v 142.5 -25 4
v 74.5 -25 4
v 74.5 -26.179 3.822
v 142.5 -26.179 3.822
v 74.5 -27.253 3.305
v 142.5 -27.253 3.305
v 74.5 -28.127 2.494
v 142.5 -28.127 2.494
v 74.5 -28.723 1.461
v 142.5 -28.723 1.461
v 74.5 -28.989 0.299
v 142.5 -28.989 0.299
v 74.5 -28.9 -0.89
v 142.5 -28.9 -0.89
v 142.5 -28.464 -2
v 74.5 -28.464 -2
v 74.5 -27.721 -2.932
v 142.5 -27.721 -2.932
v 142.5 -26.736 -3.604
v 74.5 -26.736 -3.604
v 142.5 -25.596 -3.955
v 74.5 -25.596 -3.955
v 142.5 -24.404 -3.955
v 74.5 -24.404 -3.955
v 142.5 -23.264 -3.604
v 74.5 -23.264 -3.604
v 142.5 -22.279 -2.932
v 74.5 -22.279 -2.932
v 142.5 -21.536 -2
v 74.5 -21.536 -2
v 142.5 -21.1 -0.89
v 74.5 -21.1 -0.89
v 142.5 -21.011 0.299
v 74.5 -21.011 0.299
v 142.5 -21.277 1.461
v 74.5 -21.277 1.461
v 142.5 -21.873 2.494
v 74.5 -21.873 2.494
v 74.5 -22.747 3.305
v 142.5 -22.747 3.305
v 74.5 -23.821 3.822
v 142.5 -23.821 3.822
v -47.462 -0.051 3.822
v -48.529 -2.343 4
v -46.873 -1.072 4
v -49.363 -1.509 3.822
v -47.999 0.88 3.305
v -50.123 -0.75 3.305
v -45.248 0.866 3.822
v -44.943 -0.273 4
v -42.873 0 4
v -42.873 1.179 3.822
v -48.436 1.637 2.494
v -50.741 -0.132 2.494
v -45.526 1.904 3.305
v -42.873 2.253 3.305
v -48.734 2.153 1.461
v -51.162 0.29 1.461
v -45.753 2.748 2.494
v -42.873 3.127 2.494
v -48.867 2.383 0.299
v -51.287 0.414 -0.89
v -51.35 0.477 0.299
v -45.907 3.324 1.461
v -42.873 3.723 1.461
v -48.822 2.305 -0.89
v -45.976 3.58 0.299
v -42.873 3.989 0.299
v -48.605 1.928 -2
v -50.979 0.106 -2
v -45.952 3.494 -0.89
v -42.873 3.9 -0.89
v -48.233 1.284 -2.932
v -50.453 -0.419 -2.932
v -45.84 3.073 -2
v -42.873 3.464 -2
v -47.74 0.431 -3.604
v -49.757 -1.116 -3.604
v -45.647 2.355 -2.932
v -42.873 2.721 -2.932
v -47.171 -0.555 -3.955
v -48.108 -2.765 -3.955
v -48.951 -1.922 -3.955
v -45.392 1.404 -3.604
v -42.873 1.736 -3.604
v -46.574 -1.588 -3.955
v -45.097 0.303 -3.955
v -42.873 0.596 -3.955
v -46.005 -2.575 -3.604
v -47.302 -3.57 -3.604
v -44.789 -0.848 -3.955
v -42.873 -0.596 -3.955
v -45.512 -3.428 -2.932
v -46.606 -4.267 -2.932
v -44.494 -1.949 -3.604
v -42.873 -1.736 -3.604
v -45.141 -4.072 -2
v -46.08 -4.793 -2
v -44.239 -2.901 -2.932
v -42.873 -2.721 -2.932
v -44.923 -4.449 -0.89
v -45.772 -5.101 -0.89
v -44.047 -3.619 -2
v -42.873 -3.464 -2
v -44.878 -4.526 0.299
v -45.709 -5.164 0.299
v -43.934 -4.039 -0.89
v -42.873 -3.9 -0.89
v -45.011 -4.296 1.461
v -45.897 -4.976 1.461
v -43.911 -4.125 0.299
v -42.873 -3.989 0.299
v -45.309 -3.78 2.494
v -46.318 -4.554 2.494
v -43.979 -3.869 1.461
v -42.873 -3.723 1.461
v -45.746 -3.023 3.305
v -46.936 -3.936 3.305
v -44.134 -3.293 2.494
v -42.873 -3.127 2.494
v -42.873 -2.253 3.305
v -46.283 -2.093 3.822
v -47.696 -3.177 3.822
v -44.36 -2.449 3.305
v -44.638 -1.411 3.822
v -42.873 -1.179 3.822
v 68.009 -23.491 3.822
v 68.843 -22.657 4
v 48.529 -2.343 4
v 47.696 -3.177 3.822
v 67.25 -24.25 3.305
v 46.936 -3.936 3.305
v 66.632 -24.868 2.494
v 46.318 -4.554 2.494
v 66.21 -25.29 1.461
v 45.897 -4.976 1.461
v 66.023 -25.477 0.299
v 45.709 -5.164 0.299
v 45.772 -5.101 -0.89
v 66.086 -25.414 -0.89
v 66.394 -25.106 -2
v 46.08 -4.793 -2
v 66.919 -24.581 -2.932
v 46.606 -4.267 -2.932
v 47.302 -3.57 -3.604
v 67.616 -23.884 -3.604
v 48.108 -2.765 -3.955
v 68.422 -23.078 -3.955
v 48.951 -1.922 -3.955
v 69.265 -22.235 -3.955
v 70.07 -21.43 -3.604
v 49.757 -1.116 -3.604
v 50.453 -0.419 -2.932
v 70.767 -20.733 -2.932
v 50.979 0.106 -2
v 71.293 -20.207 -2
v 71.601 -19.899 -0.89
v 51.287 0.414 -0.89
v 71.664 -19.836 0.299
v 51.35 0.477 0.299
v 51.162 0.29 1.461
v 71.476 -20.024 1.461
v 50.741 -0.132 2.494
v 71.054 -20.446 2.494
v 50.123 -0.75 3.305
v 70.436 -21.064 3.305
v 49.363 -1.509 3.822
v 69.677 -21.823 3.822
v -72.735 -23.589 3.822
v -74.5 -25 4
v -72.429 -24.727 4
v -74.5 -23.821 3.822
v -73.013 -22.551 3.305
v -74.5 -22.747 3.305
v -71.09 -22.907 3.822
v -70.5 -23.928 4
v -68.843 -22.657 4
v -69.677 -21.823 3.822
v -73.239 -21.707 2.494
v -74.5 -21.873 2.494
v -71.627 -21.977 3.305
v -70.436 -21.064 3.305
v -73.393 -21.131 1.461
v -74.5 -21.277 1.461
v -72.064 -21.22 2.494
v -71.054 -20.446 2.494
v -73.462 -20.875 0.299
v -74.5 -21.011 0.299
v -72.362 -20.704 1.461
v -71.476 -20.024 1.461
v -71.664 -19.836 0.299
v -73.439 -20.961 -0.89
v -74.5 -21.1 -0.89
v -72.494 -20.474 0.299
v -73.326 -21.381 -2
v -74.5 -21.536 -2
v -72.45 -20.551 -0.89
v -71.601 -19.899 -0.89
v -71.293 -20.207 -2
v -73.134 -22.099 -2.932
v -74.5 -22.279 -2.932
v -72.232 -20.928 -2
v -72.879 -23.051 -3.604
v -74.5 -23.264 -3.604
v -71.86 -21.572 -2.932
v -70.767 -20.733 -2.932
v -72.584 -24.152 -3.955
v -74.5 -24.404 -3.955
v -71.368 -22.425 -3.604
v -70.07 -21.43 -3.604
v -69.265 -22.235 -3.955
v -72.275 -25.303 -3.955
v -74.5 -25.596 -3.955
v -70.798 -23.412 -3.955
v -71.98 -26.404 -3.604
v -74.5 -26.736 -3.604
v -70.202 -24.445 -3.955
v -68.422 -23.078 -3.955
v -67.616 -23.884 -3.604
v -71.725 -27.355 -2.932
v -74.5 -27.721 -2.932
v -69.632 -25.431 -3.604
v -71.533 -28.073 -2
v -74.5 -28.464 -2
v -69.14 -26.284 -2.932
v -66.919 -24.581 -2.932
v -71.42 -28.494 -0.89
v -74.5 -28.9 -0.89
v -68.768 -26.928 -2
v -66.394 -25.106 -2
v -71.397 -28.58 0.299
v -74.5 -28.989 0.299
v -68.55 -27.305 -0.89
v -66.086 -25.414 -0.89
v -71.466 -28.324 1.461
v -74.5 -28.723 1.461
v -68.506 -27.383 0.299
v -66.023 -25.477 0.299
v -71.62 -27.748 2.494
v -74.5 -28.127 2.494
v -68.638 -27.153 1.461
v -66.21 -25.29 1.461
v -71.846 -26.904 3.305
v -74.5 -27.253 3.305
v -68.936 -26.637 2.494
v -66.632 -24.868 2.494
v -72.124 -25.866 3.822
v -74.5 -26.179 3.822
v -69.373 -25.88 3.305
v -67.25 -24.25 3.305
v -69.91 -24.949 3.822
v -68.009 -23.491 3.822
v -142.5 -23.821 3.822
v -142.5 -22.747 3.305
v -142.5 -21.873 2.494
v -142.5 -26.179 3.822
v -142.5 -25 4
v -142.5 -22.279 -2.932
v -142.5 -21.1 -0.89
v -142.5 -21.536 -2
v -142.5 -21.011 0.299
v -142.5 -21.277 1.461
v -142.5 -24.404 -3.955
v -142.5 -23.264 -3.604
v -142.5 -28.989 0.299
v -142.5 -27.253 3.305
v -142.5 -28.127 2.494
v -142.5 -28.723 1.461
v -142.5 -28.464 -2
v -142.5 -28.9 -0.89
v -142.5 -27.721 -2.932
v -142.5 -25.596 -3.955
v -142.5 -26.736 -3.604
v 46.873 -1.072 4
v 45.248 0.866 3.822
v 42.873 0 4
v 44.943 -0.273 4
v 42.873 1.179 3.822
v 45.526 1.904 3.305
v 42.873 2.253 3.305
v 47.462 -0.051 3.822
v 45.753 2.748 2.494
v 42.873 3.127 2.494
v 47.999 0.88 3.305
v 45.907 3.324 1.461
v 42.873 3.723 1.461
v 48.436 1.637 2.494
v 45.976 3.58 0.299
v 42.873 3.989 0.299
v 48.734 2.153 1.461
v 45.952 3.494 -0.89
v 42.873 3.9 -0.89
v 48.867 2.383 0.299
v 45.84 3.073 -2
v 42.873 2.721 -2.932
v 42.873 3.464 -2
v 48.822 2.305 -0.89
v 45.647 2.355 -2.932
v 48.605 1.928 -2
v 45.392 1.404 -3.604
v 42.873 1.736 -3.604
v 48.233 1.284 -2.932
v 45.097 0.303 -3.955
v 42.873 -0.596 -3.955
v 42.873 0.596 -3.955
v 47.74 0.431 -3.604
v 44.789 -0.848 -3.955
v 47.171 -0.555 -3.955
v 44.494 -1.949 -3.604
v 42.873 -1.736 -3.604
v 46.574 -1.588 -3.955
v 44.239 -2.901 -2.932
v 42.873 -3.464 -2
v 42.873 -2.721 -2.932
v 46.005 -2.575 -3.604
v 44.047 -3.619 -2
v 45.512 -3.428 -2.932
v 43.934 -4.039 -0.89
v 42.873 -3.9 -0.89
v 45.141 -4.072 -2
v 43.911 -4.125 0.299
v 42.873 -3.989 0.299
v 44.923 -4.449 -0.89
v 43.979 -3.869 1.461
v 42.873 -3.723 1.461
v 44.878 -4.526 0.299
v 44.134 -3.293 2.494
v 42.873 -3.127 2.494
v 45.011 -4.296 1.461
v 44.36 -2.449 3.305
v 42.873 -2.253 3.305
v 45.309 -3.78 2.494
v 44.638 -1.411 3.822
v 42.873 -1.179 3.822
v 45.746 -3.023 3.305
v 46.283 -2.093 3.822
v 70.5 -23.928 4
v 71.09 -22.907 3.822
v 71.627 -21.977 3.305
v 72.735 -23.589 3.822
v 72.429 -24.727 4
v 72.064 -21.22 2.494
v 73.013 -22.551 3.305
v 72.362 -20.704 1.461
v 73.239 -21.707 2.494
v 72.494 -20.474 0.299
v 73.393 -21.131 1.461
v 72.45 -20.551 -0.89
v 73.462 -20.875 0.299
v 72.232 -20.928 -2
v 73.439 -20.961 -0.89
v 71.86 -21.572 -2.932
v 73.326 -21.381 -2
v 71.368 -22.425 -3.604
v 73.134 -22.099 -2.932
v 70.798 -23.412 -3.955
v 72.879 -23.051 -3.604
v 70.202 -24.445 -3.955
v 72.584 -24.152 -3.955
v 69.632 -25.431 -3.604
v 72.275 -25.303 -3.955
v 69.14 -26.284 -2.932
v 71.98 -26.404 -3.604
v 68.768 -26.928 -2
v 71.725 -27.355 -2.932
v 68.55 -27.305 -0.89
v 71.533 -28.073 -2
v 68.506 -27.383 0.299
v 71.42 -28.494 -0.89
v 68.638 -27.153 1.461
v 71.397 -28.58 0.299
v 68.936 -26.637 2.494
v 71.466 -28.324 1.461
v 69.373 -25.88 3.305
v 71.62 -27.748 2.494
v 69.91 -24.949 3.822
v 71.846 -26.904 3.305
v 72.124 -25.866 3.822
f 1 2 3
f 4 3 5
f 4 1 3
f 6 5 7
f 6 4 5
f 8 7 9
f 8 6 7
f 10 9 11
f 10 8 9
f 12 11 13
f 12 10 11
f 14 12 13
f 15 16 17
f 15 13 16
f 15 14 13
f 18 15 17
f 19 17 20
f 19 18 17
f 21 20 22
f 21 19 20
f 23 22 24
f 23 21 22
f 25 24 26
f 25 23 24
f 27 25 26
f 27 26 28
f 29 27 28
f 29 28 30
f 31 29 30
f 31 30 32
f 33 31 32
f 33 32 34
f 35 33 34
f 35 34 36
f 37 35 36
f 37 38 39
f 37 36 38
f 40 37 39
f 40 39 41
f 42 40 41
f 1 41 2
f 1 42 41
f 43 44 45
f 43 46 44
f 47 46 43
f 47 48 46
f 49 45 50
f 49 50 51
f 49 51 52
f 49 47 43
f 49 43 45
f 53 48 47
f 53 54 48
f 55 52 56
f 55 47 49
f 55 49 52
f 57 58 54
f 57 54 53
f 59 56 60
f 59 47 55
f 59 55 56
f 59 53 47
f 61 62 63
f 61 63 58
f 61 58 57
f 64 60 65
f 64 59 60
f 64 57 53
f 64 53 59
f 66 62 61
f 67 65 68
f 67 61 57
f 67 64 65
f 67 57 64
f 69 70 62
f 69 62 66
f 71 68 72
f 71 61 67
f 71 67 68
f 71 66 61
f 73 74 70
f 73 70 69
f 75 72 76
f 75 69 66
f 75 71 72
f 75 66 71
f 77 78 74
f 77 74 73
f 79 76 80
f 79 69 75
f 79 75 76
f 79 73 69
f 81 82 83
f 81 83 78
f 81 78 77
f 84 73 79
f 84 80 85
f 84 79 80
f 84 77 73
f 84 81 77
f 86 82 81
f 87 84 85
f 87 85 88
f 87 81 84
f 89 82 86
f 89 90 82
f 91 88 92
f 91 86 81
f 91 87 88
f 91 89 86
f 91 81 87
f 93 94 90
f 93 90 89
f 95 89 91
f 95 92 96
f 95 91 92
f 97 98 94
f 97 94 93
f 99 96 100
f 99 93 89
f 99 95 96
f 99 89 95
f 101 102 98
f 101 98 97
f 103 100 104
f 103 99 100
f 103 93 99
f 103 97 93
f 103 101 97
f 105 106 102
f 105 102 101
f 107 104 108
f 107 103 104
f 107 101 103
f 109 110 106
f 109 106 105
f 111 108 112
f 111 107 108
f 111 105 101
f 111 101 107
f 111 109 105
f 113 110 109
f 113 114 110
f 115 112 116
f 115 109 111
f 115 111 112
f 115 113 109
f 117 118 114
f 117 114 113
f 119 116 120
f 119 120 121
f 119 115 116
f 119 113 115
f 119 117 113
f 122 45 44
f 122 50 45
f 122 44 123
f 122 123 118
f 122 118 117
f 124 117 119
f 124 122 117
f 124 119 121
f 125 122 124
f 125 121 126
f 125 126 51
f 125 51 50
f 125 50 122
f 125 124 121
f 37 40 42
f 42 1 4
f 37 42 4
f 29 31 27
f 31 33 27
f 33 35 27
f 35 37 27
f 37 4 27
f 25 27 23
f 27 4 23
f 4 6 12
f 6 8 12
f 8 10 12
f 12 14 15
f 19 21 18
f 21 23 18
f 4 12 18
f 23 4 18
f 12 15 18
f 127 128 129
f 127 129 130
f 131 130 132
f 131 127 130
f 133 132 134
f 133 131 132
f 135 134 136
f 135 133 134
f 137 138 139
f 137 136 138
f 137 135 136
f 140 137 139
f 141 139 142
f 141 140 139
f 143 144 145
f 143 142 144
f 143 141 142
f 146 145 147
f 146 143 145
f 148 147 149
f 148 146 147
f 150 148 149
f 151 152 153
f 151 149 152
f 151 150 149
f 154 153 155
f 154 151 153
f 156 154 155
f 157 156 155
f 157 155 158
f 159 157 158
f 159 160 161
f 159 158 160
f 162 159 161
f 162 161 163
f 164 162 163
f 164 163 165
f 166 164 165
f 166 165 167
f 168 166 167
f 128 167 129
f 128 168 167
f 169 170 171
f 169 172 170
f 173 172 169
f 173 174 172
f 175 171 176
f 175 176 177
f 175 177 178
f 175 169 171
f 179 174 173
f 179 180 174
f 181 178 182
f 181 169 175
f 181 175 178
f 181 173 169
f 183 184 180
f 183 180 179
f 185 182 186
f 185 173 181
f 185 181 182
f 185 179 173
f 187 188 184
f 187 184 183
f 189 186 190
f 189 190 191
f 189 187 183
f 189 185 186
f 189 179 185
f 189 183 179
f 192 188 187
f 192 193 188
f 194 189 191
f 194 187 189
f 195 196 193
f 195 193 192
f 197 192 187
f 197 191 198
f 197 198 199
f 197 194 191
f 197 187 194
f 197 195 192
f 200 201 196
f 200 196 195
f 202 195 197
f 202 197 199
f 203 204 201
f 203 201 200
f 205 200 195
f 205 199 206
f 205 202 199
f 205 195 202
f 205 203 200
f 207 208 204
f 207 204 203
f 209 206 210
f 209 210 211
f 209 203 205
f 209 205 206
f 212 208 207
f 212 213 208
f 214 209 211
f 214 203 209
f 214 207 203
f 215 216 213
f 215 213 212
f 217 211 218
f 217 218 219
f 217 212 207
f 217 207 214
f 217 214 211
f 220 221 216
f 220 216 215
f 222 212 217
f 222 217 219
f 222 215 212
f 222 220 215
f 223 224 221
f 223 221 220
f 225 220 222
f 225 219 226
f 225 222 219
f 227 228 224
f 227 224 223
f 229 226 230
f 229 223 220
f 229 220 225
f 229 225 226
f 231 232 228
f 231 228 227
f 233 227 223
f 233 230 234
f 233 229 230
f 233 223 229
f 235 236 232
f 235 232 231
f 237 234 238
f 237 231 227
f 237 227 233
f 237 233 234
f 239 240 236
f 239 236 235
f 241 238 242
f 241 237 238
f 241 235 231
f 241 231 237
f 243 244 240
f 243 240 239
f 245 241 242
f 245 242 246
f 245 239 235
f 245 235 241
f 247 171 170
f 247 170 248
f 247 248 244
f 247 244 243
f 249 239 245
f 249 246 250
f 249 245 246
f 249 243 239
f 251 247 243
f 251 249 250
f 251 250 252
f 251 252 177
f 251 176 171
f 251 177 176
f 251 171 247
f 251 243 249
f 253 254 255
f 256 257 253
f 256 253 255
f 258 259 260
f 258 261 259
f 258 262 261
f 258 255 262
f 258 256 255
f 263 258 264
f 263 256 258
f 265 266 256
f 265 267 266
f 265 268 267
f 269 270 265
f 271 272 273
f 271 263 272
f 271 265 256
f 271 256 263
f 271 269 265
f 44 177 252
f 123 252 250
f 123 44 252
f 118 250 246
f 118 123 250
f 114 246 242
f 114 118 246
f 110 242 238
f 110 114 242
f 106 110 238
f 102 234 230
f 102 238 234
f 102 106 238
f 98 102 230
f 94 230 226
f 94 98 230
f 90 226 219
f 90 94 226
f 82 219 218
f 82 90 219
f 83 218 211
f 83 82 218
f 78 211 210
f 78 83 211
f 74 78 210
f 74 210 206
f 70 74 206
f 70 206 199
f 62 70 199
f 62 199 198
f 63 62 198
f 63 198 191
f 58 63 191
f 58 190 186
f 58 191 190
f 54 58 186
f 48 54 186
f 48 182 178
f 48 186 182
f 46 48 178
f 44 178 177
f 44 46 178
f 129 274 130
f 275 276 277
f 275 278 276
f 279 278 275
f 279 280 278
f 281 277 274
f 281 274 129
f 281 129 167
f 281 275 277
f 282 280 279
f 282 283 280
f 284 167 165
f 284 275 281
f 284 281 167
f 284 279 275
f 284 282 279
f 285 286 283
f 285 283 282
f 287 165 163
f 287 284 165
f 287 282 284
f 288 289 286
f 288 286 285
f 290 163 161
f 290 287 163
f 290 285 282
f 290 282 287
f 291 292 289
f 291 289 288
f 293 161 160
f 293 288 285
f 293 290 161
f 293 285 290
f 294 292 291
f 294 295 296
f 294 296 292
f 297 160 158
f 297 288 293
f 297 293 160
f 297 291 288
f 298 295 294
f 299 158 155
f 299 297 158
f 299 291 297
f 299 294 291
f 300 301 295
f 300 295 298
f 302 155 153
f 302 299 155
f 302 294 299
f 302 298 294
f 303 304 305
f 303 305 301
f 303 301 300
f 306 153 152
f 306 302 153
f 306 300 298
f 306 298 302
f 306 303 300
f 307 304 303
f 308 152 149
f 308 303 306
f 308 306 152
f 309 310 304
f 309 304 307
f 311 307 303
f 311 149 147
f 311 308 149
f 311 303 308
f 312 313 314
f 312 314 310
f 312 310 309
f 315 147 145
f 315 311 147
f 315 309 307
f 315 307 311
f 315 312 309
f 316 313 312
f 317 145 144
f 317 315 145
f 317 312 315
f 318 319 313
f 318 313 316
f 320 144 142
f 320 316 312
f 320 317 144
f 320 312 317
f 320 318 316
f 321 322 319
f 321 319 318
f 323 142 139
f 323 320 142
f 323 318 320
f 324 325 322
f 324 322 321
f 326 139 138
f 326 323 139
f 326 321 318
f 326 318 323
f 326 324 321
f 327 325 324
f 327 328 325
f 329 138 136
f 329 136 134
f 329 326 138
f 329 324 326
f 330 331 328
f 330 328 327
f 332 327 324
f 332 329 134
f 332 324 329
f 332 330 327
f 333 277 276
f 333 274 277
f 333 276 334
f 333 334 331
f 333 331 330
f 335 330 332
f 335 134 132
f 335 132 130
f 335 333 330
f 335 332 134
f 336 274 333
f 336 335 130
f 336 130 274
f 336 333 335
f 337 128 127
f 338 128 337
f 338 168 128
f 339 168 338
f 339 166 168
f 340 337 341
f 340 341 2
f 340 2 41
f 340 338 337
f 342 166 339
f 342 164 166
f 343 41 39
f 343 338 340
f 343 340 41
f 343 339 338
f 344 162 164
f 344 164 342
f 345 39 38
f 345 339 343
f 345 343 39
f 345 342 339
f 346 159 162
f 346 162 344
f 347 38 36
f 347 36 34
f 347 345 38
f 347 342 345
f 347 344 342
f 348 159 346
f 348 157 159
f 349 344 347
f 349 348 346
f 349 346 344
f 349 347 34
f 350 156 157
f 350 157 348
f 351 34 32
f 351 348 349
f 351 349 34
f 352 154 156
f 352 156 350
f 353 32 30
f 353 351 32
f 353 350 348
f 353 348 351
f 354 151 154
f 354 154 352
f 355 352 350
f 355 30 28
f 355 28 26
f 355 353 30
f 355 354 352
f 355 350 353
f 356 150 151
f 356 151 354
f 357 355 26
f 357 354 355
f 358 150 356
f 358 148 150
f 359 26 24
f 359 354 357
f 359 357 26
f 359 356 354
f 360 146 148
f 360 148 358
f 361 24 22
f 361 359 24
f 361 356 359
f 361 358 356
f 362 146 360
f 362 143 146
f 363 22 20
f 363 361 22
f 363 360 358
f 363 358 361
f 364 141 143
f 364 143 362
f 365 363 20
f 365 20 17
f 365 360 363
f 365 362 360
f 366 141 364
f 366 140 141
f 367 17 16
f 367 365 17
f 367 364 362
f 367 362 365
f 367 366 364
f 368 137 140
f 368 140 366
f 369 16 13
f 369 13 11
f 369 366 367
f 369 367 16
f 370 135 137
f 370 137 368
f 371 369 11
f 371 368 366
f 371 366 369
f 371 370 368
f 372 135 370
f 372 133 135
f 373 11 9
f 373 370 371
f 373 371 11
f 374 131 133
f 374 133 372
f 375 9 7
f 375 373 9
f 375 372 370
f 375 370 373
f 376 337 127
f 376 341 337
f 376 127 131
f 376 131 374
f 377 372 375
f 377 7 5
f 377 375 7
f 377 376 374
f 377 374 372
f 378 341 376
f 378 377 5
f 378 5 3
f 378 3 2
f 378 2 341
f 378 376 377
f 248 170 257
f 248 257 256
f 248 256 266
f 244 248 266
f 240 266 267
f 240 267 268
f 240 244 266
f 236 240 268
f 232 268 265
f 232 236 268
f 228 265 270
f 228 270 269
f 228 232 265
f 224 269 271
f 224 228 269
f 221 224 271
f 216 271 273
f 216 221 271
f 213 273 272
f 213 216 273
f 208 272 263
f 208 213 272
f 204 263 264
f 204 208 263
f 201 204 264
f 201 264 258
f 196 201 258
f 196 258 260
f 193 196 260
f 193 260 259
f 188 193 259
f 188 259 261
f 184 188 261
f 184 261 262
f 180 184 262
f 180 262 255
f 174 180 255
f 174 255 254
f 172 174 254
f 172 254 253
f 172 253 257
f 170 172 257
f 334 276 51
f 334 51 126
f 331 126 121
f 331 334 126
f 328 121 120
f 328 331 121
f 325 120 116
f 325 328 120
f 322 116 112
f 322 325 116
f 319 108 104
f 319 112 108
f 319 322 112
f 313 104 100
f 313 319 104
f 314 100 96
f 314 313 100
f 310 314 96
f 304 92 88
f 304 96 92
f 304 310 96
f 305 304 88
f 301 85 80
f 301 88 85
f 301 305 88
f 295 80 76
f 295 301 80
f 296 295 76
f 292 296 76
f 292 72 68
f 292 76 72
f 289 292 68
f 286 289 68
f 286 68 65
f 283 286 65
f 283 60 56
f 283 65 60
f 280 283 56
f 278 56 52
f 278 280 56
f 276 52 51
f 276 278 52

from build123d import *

# Parameters (mm, degrees)
SKETCH2_R = 4


with BuildPart() as part:
    # Base-Sweep: sweep along a path in Sketch1
    with BuildLine(Plane.XY) as base_sweep_path:
        Line((-142.5, -25), (-74.5, -25))
        ThreePointArc((-74.5, -25), (-71.438532541, -24.39103626), (-68.843145751, -22.656854249))
        Line((-68.843145751, -22.656854249), (-48.529437252, -2.343145751))
        ThreePointArc((-48.529437252, -2.343145751), (-45.934050461, -0.60896374), (-42.872583002, 0))
        Line((-42.872583002, 0), (42.872583002, 0))
        ThreePointArc((42.872583002, 0), (45.934050461, -0.60896374), (48.529437252, -2.343145751))
        Line((48.529437252, -2.343145751), (68.843145751, -22.656854249))
        ThreePointArc((68.843145751, -22.656854249), (71.438532541, -24.39103626), (74.5, -25))
        Line((74.5, -25), (142.5, -25))
    # Sketch2 → Base-Sweep (sweep)
    with BuildSketch(Plane(origin=(-142.5, -25, 0), x_dir=(0, 0, 1), z_dir=(-1, 0, 0))):
        Circle(SKETCH2_R)
    sweep(path=base_sweep_path.line)


solid = part.part
